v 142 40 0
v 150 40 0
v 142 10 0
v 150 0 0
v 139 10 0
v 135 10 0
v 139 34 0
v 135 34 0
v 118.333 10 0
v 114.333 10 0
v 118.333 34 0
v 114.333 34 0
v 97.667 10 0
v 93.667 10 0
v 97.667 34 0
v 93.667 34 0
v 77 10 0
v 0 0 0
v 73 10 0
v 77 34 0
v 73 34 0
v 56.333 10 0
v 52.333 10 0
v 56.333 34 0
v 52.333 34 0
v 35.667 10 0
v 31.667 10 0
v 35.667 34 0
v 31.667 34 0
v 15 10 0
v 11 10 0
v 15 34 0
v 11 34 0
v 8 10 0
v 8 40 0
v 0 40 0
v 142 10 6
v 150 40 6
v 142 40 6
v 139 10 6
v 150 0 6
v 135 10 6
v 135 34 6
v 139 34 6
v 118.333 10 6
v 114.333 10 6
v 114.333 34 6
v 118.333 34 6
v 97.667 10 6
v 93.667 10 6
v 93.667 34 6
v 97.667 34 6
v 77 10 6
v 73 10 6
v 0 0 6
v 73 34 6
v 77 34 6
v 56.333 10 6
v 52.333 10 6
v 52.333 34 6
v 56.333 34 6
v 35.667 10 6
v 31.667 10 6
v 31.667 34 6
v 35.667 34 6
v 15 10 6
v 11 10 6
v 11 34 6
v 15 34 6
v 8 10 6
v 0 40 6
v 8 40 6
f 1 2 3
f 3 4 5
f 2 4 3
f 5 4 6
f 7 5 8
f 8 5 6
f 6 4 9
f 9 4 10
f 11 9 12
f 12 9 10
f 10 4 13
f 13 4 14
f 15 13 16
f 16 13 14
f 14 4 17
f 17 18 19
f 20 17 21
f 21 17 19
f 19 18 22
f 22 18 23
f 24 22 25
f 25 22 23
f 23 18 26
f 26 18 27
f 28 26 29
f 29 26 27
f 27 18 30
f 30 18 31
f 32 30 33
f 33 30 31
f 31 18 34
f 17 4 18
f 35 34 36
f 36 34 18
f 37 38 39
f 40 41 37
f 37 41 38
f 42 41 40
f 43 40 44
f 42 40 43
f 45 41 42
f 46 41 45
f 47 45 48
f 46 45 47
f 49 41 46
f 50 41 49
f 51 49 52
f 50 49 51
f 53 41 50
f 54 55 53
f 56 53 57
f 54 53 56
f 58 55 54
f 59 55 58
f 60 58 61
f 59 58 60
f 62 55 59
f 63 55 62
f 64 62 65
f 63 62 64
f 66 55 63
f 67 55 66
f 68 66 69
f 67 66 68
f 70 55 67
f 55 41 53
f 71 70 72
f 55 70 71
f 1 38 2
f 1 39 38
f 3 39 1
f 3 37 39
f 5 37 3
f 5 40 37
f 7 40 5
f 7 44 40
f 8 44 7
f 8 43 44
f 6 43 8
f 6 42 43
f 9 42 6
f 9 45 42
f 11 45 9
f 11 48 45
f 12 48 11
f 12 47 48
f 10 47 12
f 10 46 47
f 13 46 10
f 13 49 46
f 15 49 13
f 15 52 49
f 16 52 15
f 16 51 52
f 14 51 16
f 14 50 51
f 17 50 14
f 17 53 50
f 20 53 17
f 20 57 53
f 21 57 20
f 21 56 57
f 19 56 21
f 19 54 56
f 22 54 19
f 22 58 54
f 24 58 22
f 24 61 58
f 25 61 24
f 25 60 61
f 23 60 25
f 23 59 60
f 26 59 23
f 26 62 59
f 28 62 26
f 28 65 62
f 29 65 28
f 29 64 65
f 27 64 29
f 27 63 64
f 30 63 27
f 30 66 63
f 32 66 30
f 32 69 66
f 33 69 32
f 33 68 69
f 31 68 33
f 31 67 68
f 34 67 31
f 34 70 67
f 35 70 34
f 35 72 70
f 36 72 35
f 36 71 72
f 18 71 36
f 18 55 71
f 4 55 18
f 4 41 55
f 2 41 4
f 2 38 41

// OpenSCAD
$fn = 32;

// ----------------------------------------------------------------------
// Guard grille: 7 slats over a 150 x 40 mm plate
// ----------------------------------------------------------------------

// --- parameters (mm) ---
profile_height = 6;       // extrusion height
profile_points = 36;      // points of the closed outline

profile = [[0, 0], [150, 0], [150, 40], [142, 40], [142, 10], [139, 10], [139, 34], [135, 34], [135, 10], [118.333, 10], [118.333, 34], [114.333, 34], [114.333, 10], [97.667, 10], [97.667, 34], [93.667, 34], [93.667, 10], [77, 10], [77, 34], [73, 34], [73, 10], [56.333, 10], [56.333, 34], [52.333, 34], [52.333, 10], [35.667, 10], [35.667, 34], [31.667, 34], [31.667, 10], [15, 10], [15, 34], [11, 34], [11, 10], [8, 10], [8, 40], [0, 40]];  // single closed polygon, 36 points, counter clockwise

// --- the one profile operation ---
linear_extrude(height = profile_height) polygon(points = profile);
